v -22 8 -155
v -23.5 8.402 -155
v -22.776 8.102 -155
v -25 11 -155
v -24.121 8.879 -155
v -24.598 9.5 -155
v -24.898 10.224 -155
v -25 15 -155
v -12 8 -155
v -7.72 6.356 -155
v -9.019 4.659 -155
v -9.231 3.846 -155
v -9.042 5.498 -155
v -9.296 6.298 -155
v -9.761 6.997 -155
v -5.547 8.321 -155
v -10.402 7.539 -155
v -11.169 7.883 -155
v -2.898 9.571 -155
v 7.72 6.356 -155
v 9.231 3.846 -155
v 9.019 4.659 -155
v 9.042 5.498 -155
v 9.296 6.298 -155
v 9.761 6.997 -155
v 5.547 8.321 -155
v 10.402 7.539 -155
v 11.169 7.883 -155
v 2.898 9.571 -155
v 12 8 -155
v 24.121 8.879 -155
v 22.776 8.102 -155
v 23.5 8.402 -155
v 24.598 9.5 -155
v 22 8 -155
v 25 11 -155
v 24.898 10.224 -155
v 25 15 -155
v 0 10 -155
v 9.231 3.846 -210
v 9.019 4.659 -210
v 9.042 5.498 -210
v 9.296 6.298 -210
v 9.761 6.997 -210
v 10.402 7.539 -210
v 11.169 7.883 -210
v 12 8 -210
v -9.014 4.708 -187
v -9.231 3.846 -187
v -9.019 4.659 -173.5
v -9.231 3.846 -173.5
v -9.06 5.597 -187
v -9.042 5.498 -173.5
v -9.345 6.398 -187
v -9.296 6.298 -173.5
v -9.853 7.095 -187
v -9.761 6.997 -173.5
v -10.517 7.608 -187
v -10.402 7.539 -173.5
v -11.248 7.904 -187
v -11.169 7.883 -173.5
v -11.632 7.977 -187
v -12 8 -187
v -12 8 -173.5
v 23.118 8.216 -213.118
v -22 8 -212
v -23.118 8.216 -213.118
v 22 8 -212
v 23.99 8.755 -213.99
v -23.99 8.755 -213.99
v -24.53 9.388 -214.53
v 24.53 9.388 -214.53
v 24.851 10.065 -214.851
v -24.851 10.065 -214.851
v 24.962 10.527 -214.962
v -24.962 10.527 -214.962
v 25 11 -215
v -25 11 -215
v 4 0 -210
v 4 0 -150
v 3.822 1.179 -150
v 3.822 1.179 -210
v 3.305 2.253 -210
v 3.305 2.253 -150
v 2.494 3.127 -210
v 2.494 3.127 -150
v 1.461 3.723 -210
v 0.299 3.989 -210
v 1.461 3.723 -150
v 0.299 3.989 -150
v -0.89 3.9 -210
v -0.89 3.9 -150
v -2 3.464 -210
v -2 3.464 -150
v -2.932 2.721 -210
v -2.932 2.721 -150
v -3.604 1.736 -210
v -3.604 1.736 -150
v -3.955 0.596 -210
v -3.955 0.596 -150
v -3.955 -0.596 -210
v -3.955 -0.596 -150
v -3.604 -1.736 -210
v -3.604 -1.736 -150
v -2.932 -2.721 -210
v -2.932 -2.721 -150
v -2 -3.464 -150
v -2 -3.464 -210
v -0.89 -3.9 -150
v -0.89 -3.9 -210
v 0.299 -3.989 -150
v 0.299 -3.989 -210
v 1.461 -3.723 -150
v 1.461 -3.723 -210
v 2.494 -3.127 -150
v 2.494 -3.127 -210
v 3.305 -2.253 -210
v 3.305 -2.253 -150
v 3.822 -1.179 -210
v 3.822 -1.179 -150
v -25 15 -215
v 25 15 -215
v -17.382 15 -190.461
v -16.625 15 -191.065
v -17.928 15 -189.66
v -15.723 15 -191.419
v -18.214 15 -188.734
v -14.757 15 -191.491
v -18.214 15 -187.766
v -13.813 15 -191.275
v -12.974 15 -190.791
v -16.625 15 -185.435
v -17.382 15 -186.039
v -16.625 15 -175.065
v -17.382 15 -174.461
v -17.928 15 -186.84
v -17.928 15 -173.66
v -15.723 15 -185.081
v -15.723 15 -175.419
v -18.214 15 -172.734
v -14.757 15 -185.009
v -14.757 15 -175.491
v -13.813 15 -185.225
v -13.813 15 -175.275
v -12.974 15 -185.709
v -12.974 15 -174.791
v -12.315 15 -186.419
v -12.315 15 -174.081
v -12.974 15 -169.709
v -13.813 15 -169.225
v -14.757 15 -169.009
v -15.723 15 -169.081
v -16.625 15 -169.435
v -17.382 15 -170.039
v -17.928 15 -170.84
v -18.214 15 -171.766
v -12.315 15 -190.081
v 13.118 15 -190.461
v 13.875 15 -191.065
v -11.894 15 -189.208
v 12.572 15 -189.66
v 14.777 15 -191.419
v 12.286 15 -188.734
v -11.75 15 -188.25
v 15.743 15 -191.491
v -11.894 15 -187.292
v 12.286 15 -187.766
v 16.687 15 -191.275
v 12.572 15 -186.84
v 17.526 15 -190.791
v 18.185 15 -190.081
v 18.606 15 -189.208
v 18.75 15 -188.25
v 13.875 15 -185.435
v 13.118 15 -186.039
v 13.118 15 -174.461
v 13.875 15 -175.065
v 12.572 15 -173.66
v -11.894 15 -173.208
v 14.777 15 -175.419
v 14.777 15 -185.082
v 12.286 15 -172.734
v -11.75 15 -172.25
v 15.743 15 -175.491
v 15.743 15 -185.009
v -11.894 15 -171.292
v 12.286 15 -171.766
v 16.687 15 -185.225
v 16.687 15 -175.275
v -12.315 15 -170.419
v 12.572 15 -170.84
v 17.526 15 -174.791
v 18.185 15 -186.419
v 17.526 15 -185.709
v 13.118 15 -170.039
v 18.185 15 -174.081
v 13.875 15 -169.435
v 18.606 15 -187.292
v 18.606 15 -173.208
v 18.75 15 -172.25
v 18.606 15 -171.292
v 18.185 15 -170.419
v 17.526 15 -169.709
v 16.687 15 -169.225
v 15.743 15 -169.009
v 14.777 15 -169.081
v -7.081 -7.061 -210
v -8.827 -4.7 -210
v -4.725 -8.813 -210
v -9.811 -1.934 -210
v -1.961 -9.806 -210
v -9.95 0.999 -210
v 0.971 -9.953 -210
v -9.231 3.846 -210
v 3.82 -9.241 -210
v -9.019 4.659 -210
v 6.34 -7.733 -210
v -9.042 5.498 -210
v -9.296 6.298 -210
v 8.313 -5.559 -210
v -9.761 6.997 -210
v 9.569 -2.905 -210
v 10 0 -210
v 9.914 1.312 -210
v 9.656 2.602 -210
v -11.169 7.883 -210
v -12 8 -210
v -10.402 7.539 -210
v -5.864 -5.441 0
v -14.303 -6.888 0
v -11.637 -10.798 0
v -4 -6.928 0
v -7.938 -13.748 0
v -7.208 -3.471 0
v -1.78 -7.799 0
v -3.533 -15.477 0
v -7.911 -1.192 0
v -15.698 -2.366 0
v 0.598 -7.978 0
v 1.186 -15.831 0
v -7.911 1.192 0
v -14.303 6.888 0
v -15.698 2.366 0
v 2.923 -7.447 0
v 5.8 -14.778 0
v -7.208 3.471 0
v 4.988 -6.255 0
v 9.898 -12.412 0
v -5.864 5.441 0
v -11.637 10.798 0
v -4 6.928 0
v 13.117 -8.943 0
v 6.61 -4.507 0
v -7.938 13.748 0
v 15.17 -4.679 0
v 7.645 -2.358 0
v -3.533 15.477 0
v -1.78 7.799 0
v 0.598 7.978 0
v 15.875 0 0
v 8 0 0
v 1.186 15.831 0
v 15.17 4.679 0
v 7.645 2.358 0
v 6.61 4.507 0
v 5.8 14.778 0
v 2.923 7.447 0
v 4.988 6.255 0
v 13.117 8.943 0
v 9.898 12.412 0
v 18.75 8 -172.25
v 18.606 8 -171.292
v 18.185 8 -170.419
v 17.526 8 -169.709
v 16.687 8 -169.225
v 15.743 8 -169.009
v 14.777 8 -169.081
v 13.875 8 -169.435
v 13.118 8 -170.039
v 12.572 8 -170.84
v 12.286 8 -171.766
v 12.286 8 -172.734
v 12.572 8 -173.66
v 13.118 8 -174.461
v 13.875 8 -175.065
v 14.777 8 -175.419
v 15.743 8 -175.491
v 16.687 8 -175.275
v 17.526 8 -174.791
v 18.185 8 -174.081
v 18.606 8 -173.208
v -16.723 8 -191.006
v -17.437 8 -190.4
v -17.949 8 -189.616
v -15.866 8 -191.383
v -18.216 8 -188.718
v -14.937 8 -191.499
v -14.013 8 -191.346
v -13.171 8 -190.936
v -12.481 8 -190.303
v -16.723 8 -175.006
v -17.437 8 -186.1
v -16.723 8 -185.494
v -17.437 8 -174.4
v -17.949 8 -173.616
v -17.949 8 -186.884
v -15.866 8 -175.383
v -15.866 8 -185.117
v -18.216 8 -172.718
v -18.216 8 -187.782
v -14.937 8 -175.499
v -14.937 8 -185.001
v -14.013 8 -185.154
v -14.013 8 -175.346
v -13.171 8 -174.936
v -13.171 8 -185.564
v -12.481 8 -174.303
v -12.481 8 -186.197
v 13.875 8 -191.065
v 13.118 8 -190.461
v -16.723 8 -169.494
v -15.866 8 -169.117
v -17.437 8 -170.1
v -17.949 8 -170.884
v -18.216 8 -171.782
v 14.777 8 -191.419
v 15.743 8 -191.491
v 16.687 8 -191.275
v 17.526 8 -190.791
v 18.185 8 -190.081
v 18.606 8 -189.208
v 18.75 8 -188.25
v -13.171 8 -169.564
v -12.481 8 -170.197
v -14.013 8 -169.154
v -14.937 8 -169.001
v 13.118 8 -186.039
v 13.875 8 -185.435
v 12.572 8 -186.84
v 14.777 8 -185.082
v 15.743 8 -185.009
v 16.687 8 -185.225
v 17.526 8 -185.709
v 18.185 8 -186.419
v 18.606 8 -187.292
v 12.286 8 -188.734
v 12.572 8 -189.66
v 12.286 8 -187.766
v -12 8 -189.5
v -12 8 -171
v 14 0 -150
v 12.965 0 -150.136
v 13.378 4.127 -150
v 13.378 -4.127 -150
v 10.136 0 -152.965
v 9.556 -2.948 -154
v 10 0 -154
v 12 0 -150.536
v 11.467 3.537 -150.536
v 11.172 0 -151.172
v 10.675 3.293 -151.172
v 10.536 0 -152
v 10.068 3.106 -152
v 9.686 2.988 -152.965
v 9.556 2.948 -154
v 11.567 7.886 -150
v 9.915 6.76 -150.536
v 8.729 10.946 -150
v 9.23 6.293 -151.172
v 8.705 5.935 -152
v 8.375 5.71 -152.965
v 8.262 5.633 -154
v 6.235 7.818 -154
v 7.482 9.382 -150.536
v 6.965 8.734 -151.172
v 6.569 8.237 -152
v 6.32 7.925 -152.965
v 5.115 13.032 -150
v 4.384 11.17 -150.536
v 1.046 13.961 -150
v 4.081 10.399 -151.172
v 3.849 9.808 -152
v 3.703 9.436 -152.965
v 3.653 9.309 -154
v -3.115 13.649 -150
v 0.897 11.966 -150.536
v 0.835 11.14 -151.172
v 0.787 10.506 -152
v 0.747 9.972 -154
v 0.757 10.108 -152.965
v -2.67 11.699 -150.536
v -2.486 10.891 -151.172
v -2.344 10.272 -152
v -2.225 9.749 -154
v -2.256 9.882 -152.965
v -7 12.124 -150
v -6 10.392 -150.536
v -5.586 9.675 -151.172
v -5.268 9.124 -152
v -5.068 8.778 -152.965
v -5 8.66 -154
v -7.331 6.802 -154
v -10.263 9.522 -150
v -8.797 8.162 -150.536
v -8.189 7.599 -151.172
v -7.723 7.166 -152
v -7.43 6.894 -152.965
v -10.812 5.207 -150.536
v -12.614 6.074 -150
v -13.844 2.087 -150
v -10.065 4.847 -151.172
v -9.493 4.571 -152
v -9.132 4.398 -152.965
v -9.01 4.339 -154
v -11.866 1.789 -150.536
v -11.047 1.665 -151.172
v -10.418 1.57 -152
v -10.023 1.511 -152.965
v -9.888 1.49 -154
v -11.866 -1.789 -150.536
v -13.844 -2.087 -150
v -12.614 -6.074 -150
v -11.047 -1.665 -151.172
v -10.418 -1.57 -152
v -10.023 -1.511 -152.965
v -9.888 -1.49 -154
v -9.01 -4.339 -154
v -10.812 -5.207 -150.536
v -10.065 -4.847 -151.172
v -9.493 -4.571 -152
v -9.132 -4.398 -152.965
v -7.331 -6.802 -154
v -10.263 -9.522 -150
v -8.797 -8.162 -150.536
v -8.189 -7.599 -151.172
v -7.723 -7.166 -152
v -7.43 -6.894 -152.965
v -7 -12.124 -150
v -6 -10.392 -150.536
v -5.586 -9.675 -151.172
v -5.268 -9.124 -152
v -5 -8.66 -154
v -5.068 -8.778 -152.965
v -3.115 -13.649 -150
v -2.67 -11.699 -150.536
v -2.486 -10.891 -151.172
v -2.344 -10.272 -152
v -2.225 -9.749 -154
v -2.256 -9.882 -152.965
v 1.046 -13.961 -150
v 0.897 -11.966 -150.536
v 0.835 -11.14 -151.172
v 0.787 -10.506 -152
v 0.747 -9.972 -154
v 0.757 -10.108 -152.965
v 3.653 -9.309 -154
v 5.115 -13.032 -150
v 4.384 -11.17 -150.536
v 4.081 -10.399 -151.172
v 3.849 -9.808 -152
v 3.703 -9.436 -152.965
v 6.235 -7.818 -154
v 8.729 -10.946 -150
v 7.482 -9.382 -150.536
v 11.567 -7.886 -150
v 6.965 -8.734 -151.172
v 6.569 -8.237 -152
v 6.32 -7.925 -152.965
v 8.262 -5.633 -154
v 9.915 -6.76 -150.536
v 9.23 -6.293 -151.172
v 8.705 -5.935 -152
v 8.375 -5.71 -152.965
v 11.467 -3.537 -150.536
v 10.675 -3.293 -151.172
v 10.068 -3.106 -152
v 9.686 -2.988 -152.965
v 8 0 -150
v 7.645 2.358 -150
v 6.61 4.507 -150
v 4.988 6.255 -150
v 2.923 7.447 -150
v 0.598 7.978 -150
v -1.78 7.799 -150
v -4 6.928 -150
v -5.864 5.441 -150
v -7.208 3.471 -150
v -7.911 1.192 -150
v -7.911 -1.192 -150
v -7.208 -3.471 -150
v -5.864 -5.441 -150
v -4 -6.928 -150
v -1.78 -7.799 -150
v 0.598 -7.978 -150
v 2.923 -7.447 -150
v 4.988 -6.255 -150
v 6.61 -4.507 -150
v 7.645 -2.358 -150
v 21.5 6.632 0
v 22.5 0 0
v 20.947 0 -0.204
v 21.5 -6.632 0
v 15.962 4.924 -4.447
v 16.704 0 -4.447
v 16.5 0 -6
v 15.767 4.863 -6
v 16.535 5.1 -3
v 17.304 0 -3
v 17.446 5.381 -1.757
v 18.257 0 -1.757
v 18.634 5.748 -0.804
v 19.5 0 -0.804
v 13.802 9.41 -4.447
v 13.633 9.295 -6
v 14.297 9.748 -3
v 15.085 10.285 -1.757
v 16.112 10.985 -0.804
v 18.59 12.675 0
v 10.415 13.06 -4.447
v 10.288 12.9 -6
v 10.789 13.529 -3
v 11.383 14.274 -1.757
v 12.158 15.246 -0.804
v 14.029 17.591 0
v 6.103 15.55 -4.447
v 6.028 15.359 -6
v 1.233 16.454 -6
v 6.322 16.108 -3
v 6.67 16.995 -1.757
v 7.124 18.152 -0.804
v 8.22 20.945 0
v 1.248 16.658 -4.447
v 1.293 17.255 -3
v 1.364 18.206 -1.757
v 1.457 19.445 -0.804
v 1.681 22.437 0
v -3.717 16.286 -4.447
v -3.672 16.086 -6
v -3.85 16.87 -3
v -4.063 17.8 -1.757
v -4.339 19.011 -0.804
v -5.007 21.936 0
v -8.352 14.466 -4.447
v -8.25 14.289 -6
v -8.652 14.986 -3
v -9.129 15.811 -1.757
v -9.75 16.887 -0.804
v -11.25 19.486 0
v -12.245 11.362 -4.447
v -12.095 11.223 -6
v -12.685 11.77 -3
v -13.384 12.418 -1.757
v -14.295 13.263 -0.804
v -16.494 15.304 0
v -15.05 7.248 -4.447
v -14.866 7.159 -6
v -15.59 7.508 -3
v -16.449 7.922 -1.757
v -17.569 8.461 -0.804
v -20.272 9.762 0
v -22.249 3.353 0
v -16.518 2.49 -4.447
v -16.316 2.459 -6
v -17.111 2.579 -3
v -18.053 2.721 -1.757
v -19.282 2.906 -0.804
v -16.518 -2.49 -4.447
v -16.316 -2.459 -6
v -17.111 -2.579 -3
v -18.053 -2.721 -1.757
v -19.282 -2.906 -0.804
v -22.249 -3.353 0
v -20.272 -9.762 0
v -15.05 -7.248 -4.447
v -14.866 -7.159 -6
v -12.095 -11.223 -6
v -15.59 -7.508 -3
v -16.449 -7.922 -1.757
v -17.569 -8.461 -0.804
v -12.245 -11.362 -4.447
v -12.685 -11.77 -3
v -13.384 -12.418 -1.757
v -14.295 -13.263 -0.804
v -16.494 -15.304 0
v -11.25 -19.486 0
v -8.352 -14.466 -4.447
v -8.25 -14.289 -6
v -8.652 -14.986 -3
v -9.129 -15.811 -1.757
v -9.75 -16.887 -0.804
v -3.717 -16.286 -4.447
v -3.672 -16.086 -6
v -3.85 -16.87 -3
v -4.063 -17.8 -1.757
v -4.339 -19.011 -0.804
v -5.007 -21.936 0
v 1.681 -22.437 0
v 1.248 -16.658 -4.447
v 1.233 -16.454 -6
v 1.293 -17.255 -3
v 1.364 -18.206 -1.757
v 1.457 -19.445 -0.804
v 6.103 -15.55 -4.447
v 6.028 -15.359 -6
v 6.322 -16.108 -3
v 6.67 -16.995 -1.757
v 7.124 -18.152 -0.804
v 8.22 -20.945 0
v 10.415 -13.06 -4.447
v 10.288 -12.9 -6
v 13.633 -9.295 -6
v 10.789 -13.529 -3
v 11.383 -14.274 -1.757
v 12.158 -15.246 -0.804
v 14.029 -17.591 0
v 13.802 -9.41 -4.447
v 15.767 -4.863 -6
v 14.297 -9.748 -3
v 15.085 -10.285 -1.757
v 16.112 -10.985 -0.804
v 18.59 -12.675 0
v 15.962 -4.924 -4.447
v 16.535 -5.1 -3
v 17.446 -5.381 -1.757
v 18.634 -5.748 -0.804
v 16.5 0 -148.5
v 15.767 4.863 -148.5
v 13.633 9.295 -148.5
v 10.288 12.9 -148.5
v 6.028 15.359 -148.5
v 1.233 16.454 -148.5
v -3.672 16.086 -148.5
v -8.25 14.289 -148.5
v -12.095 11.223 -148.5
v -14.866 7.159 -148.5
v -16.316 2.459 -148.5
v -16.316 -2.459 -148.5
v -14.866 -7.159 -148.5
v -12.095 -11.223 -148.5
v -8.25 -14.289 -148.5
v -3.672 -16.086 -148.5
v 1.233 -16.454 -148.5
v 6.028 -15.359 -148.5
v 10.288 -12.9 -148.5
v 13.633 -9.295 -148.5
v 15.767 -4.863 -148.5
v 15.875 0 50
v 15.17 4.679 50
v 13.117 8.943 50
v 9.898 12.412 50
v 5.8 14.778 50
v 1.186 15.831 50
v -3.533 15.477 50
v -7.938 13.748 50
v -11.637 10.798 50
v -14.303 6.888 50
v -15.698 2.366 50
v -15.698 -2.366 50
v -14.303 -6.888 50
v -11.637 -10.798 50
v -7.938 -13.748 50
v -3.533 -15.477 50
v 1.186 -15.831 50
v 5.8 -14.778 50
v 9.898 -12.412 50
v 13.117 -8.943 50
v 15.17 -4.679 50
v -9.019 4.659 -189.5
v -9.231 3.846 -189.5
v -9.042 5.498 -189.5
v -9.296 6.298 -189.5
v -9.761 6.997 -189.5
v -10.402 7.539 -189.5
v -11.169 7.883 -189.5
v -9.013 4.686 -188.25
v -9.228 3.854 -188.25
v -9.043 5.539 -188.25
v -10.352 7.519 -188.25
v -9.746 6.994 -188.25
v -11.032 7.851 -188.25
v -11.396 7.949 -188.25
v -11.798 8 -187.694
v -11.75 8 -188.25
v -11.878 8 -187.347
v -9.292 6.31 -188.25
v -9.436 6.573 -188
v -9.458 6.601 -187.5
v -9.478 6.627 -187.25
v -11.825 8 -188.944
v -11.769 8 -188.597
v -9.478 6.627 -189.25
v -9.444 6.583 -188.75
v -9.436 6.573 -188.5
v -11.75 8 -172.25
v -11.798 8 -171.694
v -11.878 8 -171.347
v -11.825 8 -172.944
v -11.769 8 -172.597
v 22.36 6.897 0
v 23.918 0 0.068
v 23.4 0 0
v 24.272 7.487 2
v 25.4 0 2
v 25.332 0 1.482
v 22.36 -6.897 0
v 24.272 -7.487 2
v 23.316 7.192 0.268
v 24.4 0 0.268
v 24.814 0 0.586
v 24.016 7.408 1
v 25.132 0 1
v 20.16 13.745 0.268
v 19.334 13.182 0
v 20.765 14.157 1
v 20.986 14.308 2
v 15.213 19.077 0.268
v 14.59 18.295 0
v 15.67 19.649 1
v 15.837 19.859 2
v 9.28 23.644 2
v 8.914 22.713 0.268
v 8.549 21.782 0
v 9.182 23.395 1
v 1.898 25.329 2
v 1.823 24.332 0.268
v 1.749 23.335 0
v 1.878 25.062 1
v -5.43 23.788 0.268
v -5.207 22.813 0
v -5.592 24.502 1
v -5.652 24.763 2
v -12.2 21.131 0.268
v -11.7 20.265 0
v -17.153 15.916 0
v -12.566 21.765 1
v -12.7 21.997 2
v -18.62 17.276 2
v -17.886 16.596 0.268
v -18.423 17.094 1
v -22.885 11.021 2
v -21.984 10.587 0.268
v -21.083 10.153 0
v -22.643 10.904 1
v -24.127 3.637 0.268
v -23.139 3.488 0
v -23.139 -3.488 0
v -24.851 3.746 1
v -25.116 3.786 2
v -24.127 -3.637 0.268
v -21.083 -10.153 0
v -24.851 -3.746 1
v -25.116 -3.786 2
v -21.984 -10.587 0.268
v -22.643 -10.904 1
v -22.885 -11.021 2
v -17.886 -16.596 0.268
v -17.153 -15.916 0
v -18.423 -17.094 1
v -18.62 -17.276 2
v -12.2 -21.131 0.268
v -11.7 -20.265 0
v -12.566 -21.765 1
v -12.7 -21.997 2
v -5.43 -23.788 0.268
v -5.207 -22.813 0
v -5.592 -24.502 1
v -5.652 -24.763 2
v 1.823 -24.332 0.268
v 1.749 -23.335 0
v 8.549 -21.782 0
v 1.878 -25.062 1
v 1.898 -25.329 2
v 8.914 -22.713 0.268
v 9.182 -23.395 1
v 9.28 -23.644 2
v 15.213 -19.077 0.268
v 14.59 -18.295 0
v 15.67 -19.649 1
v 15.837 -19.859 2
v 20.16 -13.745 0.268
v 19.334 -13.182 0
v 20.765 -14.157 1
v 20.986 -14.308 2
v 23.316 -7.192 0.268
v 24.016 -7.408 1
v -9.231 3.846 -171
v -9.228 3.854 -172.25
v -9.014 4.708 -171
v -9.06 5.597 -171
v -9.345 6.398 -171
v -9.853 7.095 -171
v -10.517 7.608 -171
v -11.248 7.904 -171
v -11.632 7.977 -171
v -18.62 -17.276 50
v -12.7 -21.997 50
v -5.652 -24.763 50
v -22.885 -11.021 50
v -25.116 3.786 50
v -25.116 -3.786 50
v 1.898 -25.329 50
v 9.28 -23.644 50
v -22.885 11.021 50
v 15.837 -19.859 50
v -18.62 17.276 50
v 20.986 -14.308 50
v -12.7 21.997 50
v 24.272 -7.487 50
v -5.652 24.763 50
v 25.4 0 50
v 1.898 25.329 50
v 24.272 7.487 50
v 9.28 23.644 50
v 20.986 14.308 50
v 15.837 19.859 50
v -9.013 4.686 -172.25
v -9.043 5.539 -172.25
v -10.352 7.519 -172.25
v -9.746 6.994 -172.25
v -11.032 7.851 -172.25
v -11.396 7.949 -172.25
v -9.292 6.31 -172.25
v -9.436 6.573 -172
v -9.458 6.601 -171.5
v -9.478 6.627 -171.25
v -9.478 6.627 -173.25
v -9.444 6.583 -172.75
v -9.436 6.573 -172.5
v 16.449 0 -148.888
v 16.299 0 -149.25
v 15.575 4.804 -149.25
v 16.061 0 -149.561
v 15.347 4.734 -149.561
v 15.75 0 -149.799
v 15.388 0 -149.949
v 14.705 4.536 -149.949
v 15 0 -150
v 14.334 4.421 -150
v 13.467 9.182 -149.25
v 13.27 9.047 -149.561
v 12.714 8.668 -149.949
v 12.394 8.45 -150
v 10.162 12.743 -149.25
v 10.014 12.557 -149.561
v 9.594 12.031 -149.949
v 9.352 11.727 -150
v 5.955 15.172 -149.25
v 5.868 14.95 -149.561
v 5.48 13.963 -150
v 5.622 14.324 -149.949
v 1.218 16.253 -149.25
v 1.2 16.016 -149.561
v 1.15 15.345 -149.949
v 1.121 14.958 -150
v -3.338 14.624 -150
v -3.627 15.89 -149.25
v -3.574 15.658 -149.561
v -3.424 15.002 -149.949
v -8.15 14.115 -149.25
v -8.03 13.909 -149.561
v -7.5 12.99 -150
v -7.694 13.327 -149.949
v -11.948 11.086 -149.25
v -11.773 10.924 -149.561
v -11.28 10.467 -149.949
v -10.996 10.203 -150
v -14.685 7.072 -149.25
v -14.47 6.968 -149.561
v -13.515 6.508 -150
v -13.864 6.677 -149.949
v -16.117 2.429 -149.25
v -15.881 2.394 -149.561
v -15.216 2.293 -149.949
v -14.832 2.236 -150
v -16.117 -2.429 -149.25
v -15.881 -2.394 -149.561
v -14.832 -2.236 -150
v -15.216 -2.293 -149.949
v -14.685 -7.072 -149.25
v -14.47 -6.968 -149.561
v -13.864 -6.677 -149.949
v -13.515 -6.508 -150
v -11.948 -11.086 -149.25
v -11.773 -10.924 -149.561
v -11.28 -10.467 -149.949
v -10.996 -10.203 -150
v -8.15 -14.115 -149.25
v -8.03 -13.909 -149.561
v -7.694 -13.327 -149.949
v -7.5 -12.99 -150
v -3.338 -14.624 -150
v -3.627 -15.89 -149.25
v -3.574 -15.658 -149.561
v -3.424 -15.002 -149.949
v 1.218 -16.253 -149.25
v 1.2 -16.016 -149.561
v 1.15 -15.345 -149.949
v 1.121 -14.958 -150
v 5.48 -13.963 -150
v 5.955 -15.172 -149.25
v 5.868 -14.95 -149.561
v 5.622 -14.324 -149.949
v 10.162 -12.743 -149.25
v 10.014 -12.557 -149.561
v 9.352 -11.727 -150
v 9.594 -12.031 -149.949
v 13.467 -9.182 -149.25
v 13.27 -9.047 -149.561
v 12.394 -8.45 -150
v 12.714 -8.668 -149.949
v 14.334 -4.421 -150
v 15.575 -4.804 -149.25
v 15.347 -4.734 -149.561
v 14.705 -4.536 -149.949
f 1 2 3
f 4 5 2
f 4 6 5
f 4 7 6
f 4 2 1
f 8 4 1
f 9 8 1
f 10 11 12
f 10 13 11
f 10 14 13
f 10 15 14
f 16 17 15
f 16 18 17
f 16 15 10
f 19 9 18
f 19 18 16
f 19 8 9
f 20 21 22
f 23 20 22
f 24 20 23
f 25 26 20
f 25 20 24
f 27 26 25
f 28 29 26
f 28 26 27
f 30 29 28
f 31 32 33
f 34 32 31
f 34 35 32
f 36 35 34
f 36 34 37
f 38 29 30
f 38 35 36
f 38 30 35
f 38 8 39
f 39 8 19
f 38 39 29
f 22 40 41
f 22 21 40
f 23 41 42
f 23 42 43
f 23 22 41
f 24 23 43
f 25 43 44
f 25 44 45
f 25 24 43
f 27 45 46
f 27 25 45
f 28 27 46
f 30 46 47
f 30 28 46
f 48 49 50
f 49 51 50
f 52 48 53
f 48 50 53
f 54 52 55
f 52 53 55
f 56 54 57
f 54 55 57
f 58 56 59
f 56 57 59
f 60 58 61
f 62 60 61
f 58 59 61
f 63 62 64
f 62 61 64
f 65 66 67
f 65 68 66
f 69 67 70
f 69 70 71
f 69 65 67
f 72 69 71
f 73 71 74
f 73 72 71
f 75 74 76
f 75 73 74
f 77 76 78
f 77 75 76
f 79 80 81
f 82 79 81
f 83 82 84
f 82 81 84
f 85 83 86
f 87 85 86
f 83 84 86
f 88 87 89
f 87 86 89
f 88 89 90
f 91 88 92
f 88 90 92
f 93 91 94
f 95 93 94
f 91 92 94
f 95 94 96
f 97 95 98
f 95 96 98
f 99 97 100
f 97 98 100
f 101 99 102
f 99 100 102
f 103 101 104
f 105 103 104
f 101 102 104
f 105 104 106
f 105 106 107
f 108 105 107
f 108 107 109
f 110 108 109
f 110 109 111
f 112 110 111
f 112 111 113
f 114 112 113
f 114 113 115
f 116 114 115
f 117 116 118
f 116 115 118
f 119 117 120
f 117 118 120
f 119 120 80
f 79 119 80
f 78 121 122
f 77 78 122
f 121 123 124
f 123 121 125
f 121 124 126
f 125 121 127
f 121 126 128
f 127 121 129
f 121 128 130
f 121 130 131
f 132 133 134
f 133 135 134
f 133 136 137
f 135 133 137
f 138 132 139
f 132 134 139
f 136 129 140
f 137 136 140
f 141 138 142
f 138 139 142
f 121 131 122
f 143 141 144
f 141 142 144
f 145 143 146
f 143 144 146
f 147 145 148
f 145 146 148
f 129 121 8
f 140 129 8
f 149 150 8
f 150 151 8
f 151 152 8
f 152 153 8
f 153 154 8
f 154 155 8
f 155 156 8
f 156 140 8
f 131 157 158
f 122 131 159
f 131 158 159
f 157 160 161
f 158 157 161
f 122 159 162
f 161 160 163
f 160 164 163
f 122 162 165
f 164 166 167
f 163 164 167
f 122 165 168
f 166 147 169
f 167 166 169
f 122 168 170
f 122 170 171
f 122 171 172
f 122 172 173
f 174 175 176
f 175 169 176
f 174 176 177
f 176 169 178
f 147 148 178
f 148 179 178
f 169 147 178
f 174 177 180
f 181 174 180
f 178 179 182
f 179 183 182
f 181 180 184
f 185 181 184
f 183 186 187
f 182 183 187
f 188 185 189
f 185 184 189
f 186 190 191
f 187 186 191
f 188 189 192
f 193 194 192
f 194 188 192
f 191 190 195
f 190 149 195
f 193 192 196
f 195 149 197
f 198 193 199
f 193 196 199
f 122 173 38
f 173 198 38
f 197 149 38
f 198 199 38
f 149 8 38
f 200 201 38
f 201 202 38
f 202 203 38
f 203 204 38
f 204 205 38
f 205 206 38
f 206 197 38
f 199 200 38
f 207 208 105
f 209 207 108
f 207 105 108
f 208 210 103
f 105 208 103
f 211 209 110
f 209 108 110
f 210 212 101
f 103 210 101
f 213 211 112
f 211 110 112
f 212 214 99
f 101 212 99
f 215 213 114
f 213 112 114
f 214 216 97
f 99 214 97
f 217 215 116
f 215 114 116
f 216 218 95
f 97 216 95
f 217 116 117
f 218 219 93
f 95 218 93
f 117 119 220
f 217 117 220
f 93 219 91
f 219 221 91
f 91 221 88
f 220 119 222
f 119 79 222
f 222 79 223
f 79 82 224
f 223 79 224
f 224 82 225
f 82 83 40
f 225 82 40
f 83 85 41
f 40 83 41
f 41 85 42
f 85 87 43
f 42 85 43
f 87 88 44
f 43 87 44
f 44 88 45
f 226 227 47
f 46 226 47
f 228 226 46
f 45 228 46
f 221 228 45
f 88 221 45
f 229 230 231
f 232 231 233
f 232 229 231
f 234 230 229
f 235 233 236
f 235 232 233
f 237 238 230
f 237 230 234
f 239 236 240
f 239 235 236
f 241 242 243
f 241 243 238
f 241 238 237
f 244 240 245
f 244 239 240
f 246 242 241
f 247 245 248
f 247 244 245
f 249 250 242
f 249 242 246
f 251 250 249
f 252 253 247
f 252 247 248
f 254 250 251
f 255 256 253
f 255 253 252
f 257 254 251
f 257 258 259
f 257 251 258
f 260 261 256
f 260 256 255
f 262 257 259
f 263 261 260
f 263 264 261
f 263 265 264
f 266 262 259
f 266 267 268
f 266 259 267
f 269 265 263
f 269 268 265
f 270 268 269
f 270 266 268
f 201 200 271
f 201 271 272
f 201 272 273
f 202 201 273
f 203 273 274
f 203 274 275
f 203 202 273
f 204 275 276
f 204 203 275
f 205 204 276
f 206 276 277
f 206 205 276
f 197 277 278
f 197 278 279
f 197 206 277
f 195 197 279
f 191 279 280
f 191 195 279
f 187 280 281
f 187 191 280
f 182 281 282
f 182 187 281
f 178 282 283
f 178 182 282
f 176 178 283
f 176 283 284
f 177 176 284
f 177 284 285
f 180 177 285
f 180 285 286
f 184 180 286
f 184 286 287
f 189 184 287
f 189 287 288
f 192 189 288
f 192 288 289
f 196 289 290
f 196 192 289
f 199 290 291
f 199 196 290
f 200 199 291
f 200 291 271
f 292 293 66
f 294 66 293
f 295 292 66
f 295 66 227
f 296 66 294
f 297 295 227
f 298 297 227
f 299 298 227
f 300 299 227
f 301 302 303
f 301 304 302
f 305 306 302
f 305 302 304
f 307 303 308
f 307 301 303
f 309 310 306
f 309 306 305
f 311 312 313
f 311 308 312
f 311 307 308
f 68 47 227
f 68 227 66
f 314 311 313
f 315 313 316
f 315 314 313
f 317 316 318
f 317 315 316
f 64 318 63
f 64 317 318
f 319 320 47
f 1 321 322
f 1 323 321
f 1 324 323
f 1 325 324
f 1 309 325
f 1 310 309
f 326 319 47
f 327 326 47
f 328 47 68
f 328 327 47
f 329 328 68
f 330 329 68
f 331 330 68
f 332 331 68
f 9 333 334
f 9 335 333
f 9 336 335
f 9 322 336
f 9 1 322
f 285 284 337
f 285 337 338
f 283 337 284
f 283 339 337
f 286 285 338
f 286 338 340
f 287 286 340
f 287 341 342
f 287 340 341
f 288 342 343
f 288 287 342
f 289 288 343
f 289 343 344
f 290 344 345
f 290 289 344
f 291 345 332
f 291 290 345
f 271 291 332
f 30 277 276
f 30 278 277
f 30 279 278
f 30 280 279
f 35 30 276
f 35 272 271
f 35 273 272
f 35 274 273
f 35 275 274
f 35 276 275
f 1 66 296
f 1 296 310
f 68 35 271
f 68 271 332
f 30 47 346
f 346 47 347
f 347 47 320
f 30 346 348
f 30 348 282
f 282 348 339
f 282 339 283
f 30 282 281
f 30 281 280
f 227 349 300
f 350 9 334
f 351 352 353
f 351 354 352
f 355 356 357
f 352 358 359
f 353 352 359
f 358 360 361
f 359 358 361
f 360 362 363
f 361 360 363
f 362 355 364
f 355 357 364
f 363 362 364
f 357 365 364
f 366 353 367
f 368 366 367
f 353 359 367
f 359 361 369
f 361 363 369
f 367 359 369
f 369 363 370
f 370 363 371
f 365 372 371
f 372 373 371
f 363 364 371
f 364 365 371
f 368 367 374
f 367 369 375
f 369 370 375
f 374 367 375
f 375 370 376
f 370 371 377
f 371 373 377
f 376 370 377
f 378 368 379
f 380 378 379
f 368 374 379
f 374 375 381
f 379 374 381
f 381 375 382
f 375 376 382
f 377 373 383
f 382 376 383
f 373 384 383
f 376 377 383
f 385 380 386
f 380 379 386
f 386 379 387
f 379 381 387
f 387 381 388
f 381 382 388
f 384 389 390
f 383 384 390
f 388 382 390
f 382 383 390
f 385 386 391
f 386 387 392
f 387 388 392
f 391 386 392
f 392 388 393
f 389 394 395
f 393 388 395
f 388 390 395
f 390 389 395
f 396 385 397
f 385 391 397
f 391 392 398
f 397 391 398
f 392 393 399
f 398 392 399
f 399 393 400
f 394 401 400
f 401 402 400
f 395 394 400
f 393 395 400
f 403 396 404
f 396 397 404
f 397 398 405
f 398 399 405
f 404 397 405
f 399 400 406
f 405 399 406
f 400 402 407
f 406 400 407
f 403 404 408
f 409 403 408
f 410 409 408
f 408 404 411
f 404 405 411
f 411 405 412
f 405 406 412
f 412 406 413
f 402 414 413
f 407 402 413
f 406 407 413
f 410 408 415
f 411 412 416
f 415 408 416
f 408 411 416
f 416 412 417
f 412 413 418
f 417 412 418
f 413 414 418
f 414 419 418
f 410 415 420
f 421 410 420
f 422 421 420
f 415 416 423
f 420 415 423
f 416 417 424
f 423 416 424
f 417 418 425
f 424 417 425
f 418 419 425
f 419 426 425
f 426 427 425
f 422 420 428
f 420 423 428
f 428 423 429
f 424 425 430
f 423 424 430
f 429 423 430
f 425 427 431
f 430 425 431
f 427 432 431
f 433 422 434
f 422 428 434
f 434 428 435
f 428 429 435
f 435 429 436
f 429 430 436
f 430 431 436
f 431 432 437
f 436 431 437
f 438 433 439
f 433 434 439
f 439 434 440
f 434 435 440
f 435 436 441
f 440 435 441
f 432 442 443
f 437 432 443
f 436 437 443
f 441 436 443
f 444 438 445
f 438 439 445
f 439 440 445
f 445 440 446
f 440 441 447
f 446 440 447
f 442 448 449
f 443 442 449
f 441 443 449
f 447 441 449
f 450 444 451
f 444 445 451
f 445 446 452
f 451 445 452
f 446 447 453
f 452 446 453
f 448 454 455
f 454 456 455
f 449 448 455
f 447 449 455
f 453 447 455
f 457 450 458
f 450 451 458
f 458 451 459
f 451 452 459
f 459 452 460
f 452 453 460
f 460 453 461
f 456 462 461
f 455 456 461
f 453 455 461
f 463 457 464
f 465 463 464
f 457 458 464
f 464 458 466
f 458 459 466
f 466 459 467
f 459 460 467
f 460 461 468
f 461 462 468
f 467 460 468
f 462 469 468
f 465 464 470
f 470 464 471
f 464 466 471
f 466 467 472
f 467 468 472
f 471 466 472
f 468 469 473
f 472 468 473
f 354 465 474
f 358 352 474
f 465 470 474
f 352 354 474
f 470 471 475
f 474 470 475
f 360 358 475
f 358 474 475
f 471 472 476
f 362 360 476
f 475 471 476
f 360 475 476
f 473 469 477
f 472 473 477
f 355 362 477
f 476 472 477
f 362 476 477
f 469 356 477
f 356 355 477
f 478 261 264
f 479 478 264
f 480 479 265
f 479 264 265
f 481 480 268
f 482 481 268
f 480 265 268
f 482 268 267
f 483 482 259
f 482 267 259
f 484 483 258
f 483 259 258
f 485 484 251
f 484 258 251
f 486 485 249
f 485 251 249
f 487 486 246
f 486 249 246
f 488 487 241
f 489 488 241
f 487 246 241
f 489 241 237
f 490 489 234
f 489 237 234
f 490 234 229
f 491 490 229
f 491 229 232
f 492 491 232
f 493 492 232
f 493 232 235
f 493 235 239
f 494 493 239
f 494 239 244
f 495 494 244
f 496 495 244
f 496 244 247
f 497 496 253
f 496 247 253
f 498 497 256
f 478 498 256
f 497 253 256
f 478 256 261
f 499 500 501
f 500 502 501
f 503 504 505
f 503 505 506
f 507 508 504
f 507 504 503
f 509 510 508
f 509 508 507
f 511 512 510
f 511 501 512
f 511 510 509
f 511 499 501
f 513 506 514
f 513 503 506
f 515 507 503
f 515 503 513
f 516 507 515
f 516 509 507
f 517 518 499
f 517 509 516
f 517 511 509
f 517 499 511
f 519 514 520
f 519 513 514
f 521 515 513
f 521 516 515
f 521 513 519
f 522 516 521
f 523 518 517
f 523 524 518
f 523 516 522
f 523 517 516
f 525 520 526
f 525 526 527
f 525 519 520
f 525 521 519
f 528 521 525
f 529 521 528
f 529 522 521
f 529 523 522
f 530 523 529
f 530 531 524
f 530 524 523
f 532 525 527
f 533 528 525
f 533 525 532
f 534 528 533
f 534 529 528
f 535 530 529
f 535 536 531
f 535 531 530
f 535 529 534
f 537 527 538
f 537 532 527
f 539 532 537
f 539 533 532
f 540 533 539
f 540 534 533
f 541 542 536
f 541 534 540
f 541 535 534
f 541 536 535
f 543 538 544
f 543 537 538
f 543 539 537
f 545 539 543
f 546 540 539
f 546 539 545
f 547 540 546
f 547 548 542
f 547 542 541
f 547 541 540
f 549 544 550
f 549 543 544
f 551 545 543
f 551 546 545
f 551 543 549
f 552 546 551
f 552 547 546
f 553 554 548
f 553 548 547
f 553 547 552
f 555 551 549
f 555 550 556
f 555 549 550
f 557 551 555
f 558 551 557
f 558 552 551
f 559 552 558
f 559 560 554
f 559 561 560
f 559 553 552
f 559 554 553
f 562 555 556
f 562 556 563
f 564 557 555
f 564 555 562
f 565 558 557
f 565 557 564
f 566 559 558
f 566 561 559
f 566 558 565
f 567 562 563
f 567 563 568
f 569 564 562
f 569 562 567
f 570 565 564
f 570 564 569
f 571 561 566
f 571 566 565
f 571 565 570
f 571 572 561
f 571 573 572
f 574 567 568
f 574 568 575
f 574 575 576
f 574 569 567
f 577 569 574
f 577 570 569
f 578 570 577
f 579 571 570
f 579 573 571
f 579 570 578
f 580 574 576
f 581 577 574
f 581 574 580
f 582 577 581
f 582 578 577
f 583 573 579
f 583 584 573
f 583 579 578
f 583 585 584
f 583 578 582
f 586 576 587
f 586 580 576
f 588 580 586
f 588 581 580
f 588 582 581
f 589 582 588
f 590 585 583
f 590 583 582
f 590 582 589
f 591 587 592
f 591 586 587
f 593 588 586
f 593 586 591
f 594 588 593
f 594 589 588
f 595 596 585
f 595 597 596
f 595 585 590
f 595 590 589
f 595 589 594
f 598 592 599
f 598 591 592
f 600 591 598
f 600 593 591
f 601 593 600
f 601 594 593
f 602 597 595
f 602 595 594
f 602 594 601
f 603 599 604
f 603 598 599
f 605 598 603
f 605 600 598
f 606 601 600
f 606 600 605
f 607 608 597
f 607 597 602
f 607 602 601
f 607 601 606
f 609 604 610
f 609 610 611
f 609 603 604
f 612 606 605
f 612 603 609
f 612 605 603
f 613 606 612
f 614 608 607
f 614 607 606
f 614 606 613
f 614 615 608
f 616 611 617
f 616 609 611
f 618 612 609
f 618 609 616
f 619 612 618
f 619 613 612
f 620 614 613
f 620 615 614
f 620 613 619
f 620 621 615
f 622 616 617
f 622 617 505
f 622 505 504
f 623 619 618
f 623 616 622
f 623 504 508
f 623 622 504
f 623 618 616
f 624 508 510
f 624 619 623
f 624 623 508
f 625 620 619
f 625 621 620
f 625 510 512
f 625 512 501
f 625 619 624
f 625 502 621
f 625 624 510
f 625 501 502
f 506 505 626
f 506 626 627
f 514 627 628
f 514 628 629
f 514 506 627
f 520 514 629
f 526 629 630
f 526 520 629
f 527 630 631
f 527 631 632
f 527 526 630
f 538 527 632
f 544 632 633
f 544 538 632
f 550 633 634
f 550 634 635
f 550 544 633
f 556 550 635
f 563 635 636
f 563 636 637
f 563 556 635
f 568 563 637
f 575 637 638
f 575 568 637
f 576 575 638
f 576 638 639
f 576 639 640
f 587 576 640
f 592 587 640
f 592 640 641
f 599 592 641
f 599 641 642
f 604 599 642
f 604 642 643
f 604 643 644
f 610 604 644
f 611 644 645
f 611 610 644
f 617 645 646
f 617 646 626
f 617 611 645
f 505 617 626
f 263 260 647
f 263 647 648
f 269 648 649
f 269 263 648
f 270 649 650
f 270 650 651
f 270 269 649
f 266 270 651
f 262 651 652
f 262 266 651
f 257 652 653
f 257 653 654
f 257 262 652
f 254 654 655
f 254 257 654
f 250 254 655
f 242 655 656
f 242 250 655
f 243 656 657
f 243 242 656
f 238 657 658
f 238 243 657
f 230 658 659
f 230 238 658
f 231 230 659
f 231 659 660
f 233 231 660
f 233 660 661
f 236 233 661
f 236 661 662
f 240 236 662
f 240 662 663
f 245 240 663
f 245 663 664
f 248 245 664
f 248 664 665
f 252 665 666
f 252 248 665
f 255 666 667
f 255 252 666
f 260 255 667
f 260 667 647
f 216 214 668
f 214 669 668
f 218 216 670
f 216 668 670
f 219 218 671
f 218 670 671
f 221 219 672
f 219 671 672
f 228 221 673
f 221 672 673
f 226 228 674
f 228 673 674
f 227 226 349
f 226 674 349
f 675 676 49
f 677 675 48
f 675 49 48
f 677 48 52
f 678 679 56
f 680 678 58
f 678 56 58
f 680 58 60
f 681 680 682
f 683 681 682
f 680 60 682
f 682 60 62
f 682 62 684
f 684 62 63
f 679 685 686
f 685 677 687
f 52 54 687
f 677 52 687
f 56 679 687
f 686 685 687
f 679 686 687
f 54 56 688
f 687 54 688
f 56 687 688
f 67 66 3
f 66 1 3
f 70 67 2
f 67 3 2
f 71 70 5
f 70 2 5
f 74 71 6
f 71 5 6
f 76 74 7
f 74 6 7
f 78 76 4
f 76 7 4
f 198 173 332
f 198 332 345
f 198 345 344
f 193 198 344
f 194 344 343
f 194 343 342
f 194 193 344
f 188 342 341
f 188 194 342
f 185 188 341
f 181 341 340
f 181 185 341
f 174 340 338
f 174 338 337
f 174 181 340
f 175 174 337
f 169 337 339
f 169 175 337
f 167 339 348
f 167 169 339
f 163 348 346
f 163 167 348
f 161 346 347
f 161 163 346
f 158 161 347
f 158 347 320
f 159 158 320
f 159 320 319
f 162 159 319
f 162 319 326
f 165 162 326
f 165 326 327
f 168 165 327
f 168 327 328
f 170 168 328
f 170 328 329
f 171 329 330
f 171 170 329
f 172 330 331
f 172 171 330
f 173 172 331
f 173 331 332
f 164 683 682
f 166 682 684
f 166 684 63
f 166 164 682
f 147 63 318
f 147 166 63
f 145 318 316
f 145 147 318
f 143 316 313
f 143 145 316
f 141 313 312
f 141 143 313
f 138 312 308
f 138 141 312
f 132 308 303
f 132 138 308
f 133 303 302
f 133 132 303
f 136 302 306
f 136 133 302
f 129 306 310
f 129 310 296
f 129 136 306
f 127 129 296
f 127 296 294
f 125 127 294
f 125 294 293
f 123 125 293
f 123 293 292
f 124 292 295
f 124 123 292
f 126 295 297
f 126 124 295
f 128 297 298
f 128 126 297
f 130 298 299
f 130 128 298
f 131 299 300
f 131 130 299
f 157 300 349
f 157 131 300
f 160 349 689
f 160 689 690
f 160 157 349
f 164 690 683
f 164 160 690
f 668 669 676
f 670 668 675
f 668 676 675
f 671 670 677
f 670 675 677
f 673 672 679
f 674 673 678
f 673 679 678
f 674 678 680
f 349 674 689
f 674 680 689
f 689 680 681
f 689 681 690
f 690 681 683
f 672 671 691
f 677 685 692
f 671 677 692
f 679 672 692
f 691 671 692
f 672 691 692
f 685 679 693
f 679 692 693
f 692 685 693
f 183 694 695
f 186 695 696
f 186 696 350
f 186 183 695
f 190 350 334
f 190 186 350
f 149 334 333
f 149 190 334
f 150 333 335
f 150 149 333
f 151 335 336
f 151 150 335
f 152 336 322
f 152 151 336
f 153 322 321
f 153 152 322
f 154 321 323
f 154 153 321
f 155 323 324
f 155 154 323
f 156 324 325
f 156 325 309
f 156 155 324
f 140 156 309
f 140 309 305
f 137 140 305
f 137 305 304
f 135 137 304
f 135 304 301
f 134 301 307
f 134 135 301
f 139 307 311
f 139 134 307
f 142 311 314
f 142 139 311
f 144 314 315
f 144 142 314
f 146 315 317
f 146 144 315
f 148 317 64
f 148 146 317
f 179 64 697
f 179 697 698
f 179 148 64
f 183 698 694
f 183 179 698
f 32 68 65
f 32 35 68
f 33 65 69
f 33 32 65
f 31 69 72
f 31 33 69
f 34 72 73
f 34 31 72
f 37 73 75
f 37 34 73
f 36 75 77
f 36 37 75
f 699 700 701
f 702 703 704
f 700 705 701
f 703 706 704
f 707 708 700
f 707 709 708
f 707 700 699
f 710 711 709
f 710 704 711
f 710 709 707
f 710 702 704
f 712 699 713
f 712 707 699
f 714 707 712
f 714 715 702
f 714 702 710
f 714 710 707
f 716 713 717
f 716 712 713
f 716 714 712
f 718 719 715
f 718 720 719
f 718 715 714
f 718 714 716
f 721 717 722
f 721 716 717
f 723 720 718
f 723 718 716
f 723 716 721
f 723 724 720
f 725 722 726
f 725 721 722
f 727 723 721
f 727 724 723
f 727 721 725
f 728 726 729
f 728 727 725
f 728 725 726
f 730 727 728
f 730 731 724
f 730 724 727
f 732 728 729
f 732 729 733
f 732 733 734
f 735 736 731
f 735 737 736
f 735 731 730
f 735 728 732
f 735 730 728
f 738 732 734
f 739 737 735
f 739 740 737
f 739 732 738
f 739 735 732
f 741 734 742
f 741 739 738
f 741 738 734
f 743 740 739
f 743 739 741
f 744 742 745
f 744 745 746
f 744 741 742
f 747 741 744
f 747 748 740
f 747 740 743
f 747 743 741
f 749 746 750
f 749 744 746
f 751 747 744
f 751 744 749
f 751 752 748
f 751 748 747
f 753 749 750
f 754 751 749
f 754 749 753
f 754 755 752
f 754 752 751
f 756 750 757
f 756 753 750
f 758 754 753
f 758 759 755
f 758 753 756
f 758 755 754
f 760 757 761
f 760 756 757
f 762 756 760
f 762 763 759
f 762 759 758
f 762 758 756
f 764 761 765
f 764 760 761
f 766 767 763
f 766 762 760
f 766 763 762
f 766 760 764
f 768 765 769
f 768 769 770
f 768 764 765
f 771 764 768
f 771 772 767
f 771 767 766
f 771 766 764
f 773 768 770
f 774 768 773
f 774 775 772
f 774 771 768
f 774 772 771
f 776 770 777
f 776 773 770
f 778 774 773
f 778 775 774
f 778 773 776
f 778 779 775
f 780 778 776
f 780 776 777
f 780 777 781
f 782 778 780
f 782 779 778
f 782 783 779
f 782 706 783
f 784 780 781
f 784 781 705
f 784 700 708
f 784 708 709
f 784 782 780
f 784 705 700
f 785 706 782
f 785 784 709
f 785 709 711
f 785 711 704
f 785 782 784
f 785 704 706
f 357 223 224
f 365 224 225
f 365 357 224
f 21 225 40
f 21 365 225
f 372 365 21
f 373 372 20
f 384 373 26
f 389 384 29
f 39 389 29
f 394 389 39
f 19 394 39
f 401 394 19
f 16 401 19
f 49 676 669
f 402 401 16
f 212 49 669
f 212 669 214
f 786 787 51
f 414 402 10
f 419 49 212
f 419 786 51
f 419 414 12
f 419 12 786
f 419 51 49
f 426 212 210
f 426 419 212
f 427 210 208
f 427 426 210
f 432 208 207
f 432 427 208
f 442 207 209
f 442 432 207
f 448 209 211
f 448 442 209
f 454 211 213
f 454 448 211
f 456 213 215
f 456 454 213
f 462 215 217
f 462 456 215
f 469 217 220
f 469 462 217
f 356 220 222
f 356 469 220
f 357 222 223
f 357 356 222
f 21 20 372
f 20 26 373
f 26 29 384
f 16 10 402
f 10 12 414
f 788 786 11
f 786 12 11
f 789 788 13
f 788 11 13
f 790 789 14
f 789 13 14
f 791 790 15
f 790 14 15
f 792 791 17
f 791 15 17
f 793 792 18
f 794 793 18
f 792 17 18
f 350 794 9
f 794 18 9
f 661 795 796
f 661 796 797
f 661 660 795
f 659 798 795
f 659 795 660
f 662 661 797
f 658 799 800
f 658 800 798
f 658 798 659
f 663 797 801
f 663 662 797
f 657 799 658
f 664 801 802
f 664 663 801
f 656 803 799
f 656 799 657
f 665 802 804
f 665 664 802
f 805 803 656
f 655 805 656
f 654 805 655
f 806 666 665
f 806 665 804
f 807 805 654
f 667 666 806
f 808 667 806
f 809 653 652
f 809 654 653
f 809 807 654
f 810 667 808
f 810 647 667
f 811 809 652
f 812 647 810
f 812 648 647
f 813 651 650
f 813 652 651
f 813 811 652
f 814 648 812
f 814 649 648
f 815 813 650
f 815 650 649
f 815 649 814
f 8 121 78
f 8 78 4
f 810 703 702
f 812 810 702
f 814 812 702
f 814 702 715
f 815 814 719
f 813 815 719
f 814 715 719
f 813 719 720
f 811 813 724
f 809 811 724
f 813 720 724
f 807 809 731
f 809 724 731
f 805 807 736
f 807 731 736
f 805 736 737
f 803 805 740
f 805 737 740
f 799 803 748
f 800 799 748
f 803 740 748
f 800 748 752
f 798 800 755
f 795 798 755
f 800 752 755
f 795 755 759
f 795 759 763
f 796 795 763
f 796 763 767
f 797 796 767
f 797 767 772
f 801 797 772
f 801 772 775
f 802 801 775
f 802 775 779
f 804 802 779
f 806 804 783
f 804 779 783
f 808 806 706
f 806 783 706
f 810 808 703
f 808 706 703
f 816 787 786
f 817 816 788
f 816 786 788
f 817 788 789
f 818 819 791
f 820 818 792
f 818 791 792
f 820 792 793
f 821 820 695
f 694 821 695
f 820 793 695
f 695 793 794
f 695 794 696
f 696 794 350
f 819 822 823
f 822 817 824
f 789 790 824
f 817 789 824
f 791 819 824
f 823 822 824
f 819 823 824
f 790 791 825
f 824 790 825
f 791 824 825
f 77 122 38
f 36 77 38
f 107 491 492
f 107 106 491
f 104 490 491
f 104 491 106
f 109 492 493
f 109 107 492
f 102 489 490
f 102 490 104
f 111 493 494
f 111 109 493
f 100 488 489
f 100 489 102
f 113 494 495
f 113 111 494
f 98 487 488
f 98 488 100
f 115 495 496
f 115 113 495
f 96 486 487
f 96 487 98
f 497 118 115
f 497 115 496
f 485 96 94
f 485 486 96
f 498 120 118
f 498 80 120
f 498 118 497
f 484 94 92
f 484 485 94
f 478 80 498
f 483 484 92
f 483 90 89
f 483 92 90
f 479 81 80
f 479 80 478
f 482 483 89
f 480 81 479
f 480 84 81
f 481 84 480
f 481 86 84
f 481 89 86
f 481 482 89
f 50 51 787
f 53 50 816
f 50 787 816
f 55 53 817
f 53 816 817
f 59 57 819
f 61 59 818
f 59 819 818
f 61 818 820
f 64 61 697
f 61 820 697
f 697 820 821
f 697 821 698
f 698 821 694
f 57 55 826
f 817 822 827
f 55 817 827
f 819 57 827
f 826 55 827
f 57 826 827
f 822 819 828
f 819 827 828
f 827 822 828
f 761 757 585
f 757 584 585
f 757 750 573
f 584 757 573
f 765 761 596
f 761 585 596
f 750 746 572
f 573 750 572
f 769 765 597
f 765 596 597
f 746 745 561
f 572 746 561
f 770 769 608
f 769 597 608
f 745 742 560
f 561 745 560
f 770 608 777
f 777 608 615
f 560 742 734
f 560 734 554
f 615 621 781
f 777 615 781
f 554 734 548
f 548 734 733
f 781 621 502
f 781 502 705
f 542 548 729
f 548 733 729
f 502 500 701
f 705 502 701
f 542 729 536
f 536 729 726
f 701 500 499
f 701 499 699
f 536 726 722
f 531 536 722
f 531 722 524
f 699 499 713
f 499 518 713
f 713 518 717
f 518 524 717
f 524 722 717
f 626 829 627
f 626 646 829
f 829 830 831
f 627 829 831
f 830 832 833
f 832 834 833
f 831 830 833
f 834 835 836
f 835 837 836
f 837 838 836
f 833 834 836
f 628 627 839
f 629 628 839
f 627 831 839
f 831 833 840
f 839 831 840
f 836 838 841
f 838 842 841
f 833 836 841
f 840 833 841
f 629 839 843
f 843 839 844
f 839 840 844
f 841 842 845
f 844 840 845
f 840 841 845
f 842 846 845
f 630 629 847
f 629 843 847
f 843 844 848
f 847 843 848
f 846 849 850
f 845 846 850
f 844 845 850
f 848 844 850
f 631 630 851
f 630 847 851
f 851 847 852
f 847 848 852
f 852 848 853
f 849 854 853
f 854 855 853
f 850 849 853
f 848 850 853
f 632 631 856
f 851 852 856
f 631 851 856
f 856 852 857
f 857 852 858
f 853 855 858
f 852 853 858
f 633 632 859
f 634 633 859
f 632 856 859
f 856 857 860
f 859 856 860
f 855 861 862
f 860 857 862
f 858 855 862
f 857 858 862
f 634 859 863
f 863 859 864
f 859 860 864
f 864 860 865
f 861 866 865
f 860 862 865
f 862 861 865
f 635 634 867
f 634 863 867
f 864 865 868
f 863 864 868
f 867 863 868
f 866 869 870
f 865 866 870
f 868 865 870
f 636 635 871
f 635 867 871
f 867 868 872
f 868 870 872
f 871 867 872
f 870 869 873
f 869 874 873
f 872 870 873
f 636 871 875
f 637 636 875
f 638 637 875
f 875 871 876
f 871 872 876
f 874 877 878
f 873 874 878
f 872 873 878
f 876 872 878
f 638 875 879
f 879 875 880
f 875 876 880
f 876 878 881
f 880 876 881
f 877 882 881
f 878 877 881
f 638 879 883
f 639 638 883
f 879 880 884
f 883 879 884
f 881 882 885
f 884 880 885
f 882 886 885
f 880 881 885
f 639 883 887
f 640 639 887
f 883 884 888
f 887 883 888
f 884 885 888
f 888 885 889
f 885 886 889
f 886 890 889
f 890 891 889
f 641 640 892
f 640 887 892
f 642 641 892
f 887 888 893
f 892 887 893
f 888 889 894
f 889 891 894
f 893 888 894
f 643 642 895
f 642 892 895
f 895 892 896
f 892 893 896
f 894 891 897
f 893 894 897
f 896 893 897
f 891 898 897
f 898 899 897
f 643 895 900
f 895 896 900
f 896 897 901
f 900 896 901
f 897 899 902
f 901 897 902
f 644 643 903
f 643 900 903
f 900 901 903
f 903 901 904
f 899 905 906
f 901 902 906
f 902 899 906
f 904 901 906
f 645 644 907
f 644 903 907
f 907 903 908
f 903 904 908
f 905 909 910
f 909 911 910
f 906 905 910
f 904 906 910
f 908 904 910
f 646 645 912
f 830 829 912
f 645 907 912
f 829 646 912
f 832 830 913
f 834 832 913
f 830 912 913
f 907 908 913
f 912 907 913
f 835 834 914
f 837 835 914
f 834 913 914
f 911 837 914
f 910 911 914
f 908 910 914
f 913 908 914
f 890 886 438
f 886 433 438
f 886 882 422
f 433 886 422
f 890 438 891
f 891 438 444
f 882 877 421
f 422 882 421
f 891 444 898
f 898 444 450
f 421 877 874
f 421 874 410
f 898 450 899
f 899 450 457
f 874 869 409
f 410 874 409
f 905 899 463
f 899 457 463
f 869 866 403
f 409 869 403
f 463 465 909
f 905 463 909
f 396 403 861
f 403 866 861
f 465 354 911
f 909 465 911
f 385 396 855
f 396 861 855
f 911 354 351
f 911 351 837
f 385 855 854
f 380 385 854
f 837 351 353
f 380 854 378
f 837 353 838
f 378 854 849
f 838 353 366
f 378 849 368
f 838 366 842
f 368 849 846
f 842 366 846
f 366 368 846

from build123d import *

# Parameters (mm, degrees)
SKETCH001_R      = 16.5
SKETCH001_R_2    = 8
EXTRUDE001_DEPTH = 150
SKETCH002_R      = 10
SKETCH002_R_2    = 4
EXTRUDE002_DEPTH = 60
SKETCH003_W      = 50
SKETCH003_H      = 60
SKETCH003_R      = 3.25
EXTRUDE003_DEPTH = 7
SKETCH_R         = 25.4
SKETCH_R_2       = 15.875
EXTRUDE_DEPTH    = 50
FILLET_1_R       = 6
FILLET_2_R       = 4
FILLET_3_R       = 3
FILLET_4_R       = 2
FILLET_5_R       = 1.5


with BuildPart() as midpipe:
    # Sketch001 → Extrude001 (new body)
    with BuildSketch(Plane.XY):
        Circle(SKETCH001_R)
        Circle(SKETCH001_R_2, mode=Mode.SUBTRACT)
    extrude(amount=-EXTRUDE001_DEPTH)


with BuildPart() as basepipe:
    # Sketch002 → Extrude002 (new body)
    with BuildSketch(Plane.XY.offset(-150)):
        Circle(SKETCH002_R)
        Circle(SKETCH002_R_2, mode=Mode.SUBTRACT)
    extrude(amount=-EXTRUDE002_DEPTH)


with BuildPart() as flatmount:
    # Sketch003 → Extrude003 (new body)
    with BuildSketch(Plane(origin=(0, 15, -185), x_dir=(1, 0, 0), z_dir=(0, -1, 0))):
        Rectangle(SKETCH003_W, SKETCH003_H)
        with Locations((-15, 12.75)):
            Circle(SKETCH003_R, mode=Mode.SUBTRACT)
        with Locations((-15, -3.25)):
            Circle(SKETCH003_R, mode=Mode.SUBTRACT)
        with Locations((15.5, 12.75)):
            Circle(SKETCH003_R, mode=Mode.SUBTRACT)
        with Locations((15.5, -3.250048)):
            Circle(SKETCH003_R, mode=Mode.SUBTRACT)
    extrude(amount=EXTRUDE003_DEPTH)


with BuildPart() as mountfillet:
    # Sketch → Extrude (new body)
    with BuildSketch(Plane.XY):
        Circle(SKETCH_R)
        Circle(SKETCH_R_2, mode=Mode.SUBTRACT)
    extrude(amount=EXTRUDE_DEPTH)

    # Fusion: union midPipe, basePipe, flatMount
    add(midpipe.part)
    add(basepipe.part)
    add(flatmount.part)

    # Fillet 1
    fillet_1_edges = [mountfillet.edges().sort_by_distance(p)[0] for p in [
        (-16.5, 0, 0),
    ]]
    fillet(fillet_1_edges, radius=FILLET_1_R)

    # Fillet 2
    fillet_2_edges = [mountfillet.edges().sort_by_distance(p)[0] for p in [
        (-10, 0, -150),
    ]]
    fillet(fillet_2_edges, radius=FILLET_2_R)

    # Fillet 3
    fillet_3_edges = [mountfillet.edges().sort_by_distance(p)[0] for p in [
        (6, 8, -182.5),
        (-6, 8, -182.5),
        (-25, 8, -185),
        (0, 8, -215),
        (25, 8, -185),
    ]]
    fillet(fillet_3_edges, radius=FILLET_3_R)

    # Fillet 4
    fillet_4_edges = [mountfillet.edges().sort_by_distance(p)[0] for p in [
        (-25.4, 0, 0),
    ]]
    fillet(fillet_4_edges, radius=FILLET_4_R)

    # Fillet 5
    fillet_5_edges = [mountfillet.edges().sort_by_distance(p)[0] for p in [
        (-16.5, 0, -150),
    ]]
    fillet(fillet_5_edges, radius=FILLET_5_R)


solid = mountfillet.part
